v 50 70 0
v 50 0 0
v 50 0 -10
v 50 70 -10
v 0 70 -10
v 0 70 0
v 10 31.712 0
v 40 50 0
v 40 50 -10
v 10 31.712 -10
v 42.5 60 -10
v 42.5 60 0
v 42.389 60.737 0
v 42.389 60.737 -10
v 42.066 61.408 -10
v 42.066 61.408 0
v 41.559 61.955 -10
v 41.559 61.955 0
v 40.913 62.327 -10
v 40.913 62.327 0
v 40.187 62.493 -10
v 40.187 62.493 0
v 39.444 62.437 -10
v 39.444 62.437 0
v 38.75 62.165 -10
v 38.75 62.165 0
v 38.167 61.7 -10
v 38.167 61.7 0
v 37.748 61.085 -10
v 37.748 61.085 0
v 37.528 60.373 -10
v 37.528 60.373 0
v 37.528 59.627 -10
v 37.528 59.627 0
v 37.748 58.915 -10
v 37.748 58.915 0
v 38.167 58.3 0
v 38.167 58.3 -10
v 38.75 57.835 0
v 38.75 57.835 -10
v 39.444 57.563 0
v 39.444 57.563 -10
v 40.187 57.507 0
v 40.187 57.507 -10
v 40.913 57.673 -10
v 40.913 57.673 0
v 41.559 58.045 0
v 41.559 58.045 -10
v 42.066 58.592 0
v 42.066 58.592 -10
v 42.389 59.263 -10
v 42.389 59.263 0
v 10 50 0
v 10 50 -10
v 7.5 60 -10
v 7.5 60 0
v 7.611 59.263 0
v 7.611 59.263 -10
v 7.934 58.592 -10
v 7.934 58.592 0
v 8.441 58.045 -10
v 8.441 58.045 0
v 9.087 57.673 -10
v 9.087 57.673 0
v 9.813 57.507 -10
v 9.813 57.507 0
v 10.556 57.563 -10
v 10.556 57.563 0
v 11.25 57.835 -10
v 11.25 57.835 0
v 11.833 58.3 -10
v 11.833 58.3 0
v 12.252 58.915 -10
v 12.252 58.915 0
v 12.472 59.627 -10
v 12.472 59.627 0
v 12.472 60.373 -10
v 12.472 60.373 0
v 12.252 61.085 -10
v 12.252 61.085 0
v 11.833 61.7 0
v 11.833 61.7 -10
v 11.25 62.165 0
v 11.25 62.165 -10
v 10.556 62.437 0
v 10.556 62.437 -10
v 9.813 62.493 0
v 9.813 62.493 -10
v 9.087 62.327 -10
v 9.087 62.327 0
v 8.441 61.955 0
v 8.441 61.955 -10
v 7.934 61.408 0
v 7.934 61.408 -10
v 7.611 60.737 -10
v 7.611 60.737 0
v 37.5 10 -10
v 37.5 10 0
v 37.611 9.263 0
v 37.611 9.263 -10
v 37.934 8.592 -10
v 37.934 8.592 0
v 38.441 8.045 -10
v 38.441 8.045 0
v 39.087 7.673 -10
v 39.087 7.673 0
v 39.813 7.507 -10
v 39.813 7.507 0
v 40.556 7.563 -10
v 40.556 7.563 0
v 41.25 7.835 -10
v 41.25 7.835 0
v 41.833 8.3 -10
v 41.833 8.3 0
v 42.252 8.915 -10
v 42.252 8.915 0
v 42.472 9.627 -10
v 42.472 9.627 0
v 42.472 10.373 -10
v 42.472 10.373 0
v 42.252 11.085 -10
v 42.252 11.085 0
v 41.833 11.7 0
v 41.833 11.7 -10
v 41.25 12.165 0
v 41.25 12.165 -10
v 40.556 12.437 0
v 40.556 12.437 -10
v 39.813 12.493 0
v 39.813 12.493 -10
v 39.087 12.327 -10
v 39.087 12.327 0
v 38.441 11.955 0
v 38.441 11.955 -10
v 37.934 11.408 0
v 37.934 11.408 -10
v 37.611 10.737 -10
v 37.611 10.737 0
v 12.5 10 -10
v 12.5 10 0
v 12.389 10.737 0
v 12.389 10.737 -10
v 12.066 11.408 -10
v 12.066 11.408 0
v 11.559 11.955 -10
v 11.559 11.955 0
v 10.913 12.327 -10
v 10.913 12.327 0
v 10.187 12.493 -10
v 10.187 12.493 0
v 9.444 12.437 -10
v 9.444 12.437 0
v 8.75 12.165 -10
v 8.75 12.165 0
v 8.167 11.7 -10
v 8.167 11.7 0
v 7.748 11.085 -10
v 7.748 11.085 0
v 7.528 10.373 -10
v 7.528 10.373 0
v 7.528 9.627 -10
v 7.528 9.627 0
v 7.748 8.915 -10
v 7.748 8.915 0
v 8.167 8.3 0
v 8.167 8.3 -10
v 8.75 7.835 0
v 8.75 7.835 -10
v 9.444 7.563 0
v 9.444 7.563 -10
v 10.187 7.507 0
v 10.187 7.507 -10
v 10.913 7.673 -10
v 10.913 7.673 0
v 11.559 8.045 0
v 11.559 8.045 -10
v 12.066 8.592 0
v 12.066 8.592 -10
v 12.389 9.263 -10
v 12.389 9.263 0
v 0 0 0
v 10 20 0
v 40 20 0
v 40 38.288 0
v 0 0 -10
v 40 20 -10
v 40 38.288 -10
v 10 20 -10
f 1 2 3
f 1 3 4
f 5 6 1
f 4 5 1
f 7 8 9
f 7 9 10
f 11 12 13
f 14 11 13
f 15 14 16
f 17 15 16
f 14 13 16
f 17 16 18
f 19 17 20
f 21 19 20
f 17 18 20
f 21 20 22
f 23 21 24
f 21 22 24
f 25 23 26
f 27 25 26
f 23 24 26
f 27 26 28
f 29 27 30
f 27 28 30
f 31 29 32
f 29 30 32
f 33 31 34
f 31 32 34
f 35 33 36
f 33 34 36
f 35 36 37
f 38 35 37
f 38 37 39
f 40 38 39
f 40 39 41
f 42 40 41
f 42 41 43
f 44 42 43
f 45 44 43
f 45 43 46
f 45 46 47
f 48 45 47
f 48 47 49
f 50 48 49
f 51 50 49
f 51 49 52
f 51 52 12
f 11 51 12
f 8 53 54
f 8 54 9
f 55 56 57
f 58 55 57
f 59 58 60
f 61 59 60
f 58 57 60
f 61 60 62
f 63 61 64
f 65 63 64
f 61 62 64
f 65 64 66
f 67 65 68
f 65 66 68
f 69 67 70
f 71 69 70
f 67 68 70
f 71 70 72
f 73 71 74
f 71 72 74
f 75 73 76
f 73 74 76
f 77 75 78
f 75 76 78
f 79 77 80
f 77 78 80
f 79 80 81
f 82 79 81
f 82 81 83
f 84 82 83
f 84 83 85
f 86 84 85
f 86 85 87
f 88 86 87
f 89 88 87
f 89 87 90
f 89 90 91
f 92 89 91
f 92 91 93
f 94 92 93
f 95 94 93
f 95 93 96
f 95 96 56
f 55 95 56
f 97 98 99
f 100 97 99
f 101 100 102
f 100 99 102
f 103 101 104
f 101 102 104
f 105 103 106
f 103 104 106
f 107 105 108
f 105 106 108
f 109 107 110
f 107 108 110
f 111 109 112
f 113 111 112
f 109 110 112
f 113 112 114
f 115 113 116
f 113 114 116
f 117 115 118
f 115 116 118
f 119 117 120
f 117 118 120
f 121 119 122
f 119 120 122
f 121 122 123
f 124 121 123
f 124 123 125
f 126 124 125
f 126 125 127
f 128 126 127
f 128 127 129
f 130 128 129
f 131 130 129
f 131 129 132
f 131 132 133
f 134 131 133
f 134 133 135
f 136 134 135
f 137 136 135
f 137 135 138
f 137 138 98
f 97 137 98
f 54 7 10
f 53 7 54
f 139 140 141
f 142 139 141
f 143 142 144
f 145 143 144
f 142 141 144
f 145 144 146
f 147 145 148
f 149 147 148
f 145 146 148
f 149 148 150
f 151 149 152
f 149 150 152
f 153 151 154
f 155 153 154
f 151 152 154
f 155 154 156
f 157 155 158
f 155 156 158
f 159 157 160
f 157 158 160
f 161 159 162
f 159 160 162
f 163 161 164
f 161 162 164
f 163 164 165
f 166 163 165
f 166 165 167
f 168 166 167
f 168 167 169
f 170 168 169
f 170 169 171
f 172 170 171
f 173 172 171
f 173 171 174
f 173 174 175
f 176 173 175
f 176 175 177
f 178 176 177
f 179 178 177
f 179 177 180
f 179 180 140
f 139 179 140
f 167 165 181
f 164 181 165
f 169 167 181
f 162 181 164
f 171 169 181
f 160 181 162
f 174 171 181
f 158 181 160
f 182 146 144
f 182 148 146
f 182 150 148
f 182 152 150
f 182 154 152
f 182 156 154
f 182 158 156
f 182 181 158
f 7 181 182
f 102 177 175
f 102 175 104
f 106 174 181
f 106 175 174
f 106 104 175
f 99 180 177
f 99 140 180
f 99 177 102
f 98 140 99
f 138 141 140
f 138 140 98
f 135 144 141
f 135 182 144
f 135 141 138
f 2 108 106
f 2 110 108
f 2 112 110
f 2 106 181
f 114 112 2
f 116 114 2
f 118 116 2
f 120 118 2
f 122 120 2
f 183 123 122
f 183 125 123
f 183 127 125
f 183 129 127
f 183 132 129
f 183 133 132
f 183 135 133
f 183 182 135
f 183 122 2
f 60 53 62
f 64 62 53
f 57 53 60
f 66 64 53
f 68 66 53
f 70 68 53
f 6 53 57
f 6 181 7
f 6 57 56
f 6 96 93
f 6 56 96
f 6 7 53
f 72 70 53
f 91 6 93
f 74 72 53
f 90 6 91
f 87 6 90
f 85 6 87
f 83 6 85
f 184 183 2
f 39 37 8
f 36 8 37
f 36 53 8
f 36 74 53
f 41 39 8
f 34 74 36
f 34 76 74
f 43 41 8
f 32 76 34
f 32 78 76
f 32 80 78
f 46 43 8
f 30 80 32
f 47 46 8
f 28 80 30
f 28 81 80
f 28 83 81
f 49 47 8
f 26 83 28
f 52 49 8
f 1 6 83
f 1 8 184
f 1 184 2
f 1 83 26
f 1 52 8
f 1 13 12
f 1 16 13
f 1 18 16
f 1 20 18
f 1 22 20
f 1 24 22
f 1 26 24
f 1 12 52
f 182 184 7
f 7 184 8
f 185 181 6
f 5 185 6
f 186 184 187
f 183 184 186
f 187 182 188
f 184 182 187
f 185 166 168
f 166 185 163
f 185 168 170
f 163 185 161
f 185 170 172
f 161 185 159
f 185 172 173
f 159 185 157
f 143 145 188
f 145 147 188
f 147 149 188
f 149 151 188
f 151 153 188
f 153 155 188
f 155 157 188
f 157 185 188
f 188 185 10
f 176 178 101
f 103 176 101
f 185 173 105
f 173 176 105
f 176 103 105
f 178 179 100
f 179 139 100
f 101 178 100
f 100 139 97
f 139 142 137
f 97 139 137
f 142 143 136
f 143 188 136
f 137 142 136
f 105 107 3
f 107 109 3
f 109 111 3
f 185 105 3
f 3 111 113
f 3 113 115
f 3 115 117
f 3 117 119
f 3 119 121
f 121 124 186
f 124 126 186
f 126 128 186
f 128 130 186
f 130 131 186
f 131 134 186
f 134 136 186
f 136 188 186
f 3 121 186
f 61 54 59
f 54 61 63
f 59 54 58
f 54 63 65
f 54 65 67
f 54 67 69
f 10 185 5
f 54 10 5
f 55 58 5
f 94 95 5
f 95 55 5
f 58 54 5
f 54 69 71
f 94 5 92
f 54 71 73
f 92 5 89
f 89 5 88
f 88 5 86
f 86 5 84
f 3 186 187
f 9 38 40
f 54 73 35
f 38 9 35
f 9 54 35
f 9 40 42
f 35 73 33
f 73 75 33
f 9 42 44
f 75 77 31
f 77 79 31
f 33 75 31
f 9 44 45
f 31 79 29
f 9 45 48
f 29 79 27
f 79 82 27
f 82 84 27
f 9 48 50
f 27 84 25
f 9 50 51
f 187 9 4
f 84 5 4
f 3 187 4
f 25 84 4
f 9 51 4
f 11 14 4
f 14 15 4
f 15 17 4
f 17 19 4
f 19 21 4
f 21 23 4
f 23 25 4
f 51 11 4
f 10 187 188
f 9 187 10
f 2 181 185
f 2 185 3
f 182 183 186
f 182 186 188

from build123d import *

# Parameters (mm, degrees)
SKETCH1_W          = 50
SKETCH1_H          = 70
BASE_FLANGE1_DEPTH = 10
CUT_EXTRUDE1_REACH = 88.603
SKETCH6_R          = 2.5


# Sheet-metal steps are written as plain solids
with BuildPart() as part:
    # Sketch1 → Base-Flange1 (new body)
    with BuildSketch(Plane.XY):
        with Locations((25, 35)):
            Rectangle(SKETCH1_W, SKETCH1_H)
    extrude(amount=-BASE_FLANGE1_DEPTH)

    # Sketch6 → Cut-Extrude1 (cut, up to next)
    with BuildSketch(Plane.XY, mode=Mode.PRIVATE) as cut_extrude1_sk1:
        with Locations((40, 60)):
            Circle(SKETCH6_R)
    cut_extrude1_tool1 = extrude(cut_extrude1_sk1.sketch, amount=-CUT_EXTRUDE1_REACH, mode=Mode.PRIVATE) & part.part
    # Sketch6 → Cut-Extrude1 (cut, up to next)
    with BuildSketch(Plane.XY, mode=Mode.PRIVATE) as cut_extrude1_sk2:
        with Locations((10, 10)):
            Circle(SKETCH6_R)
    cut_extrude1_tool2 = extrude(cut_extrude1_sk2.sketch, amount=-CUT_EXTRUDE1_REACH, mode=Mode.PRIVATE) & part.part
    # Sketch6 → Cut-Extrude1 (cut, up to next)
    with BuildSketch(Plane.XY, mode=Mode.PRIVATE) as cut_extrude1_sk3:
        with Locations(Location((10, 60, 0), (0, 0, 180))):
            Circle(SKETCH6_R)
    cut_extrude1_tool3 = extrude(cut_extrude1_sk3.sketch, amount=-CUT_EXTRUDE1_REACH, mode=Mode.PRIVATE) & part.part
    # Sketch6 → Cut-Extrude1 (cut, up to next)
    with BuildSketch(Plane.XY, mode=Mode.PRIVATE) as cut_extrude1_sk4:
        with Locations(Location((40, 10, 0), (0, 0, 180))):
            Circle(SKETCH6_R)
    cut_extrude1_tool4 = extrude(cut_extrude1_sk4.sketch, amount=-CUT_EXTRUDE1_REACH, mode=Mode.PRIVATE) & part.part
    # Sketch6 → Cut-Extrude1 (cut, up to next)
    with BuildSketch(Plane.XY, mode=Mode.PRIVATE) as cut_extrude1_sk5:
        Polygon((40, 38.288353904), (40, 20), (10, 20), align=None)
    cut_extrude1_tool5 = extrude(cut_extrude1_sk5.sketch, amount=-CUT_EXTRUDE1_REACH, mode=Mode.PRIVATE) & part.part
    # Sketch6 → Cut-Extrude1 (cut, up to next)
    with BuildSketch(Plane.XY, mode=Mode.PRIVATE) as cut_extrude1_sk6:
        Polygon((40, 50), (10, 31.711646096), (10, 50), align=None)
    cut_extrude1_tool6 = extrude(cut_extrude1_sk6.sketch, amount=-CUT_EXTRUDE1_REACH, mode=Mode.PRIVATE) & part.part
    add(cut_extrude1_tool1.solids().sort_by_distance((40, 60, 0))[0], mode=Mode.SUBTRACT)
    add(cut_extrude1_tool2.solids().sort_by_distance((10, 10, 0))[0], mode=Mode.SUBTRACT)
    add(cut_extrude1_tool3.solids().sort_by_distance((10, 60, 0))[0], mode=Mode.SUBTRACT)
    add(cut_extrude1_tool4.solids().sort_by_distance((40, 10, 0))[0], mode=Mode.SUBTRACT)
    add(cut_extrude1_tool5.solids().sort_by_distance((30, 26.096118, 0))[0], mode=Mode.SUBTRACT)
    add(cut_extrude1_tool6.solids().sort_by_distance((20, 43.903882, 0))[0], mode=Mode.SUBTRACT)


solid = part.part
